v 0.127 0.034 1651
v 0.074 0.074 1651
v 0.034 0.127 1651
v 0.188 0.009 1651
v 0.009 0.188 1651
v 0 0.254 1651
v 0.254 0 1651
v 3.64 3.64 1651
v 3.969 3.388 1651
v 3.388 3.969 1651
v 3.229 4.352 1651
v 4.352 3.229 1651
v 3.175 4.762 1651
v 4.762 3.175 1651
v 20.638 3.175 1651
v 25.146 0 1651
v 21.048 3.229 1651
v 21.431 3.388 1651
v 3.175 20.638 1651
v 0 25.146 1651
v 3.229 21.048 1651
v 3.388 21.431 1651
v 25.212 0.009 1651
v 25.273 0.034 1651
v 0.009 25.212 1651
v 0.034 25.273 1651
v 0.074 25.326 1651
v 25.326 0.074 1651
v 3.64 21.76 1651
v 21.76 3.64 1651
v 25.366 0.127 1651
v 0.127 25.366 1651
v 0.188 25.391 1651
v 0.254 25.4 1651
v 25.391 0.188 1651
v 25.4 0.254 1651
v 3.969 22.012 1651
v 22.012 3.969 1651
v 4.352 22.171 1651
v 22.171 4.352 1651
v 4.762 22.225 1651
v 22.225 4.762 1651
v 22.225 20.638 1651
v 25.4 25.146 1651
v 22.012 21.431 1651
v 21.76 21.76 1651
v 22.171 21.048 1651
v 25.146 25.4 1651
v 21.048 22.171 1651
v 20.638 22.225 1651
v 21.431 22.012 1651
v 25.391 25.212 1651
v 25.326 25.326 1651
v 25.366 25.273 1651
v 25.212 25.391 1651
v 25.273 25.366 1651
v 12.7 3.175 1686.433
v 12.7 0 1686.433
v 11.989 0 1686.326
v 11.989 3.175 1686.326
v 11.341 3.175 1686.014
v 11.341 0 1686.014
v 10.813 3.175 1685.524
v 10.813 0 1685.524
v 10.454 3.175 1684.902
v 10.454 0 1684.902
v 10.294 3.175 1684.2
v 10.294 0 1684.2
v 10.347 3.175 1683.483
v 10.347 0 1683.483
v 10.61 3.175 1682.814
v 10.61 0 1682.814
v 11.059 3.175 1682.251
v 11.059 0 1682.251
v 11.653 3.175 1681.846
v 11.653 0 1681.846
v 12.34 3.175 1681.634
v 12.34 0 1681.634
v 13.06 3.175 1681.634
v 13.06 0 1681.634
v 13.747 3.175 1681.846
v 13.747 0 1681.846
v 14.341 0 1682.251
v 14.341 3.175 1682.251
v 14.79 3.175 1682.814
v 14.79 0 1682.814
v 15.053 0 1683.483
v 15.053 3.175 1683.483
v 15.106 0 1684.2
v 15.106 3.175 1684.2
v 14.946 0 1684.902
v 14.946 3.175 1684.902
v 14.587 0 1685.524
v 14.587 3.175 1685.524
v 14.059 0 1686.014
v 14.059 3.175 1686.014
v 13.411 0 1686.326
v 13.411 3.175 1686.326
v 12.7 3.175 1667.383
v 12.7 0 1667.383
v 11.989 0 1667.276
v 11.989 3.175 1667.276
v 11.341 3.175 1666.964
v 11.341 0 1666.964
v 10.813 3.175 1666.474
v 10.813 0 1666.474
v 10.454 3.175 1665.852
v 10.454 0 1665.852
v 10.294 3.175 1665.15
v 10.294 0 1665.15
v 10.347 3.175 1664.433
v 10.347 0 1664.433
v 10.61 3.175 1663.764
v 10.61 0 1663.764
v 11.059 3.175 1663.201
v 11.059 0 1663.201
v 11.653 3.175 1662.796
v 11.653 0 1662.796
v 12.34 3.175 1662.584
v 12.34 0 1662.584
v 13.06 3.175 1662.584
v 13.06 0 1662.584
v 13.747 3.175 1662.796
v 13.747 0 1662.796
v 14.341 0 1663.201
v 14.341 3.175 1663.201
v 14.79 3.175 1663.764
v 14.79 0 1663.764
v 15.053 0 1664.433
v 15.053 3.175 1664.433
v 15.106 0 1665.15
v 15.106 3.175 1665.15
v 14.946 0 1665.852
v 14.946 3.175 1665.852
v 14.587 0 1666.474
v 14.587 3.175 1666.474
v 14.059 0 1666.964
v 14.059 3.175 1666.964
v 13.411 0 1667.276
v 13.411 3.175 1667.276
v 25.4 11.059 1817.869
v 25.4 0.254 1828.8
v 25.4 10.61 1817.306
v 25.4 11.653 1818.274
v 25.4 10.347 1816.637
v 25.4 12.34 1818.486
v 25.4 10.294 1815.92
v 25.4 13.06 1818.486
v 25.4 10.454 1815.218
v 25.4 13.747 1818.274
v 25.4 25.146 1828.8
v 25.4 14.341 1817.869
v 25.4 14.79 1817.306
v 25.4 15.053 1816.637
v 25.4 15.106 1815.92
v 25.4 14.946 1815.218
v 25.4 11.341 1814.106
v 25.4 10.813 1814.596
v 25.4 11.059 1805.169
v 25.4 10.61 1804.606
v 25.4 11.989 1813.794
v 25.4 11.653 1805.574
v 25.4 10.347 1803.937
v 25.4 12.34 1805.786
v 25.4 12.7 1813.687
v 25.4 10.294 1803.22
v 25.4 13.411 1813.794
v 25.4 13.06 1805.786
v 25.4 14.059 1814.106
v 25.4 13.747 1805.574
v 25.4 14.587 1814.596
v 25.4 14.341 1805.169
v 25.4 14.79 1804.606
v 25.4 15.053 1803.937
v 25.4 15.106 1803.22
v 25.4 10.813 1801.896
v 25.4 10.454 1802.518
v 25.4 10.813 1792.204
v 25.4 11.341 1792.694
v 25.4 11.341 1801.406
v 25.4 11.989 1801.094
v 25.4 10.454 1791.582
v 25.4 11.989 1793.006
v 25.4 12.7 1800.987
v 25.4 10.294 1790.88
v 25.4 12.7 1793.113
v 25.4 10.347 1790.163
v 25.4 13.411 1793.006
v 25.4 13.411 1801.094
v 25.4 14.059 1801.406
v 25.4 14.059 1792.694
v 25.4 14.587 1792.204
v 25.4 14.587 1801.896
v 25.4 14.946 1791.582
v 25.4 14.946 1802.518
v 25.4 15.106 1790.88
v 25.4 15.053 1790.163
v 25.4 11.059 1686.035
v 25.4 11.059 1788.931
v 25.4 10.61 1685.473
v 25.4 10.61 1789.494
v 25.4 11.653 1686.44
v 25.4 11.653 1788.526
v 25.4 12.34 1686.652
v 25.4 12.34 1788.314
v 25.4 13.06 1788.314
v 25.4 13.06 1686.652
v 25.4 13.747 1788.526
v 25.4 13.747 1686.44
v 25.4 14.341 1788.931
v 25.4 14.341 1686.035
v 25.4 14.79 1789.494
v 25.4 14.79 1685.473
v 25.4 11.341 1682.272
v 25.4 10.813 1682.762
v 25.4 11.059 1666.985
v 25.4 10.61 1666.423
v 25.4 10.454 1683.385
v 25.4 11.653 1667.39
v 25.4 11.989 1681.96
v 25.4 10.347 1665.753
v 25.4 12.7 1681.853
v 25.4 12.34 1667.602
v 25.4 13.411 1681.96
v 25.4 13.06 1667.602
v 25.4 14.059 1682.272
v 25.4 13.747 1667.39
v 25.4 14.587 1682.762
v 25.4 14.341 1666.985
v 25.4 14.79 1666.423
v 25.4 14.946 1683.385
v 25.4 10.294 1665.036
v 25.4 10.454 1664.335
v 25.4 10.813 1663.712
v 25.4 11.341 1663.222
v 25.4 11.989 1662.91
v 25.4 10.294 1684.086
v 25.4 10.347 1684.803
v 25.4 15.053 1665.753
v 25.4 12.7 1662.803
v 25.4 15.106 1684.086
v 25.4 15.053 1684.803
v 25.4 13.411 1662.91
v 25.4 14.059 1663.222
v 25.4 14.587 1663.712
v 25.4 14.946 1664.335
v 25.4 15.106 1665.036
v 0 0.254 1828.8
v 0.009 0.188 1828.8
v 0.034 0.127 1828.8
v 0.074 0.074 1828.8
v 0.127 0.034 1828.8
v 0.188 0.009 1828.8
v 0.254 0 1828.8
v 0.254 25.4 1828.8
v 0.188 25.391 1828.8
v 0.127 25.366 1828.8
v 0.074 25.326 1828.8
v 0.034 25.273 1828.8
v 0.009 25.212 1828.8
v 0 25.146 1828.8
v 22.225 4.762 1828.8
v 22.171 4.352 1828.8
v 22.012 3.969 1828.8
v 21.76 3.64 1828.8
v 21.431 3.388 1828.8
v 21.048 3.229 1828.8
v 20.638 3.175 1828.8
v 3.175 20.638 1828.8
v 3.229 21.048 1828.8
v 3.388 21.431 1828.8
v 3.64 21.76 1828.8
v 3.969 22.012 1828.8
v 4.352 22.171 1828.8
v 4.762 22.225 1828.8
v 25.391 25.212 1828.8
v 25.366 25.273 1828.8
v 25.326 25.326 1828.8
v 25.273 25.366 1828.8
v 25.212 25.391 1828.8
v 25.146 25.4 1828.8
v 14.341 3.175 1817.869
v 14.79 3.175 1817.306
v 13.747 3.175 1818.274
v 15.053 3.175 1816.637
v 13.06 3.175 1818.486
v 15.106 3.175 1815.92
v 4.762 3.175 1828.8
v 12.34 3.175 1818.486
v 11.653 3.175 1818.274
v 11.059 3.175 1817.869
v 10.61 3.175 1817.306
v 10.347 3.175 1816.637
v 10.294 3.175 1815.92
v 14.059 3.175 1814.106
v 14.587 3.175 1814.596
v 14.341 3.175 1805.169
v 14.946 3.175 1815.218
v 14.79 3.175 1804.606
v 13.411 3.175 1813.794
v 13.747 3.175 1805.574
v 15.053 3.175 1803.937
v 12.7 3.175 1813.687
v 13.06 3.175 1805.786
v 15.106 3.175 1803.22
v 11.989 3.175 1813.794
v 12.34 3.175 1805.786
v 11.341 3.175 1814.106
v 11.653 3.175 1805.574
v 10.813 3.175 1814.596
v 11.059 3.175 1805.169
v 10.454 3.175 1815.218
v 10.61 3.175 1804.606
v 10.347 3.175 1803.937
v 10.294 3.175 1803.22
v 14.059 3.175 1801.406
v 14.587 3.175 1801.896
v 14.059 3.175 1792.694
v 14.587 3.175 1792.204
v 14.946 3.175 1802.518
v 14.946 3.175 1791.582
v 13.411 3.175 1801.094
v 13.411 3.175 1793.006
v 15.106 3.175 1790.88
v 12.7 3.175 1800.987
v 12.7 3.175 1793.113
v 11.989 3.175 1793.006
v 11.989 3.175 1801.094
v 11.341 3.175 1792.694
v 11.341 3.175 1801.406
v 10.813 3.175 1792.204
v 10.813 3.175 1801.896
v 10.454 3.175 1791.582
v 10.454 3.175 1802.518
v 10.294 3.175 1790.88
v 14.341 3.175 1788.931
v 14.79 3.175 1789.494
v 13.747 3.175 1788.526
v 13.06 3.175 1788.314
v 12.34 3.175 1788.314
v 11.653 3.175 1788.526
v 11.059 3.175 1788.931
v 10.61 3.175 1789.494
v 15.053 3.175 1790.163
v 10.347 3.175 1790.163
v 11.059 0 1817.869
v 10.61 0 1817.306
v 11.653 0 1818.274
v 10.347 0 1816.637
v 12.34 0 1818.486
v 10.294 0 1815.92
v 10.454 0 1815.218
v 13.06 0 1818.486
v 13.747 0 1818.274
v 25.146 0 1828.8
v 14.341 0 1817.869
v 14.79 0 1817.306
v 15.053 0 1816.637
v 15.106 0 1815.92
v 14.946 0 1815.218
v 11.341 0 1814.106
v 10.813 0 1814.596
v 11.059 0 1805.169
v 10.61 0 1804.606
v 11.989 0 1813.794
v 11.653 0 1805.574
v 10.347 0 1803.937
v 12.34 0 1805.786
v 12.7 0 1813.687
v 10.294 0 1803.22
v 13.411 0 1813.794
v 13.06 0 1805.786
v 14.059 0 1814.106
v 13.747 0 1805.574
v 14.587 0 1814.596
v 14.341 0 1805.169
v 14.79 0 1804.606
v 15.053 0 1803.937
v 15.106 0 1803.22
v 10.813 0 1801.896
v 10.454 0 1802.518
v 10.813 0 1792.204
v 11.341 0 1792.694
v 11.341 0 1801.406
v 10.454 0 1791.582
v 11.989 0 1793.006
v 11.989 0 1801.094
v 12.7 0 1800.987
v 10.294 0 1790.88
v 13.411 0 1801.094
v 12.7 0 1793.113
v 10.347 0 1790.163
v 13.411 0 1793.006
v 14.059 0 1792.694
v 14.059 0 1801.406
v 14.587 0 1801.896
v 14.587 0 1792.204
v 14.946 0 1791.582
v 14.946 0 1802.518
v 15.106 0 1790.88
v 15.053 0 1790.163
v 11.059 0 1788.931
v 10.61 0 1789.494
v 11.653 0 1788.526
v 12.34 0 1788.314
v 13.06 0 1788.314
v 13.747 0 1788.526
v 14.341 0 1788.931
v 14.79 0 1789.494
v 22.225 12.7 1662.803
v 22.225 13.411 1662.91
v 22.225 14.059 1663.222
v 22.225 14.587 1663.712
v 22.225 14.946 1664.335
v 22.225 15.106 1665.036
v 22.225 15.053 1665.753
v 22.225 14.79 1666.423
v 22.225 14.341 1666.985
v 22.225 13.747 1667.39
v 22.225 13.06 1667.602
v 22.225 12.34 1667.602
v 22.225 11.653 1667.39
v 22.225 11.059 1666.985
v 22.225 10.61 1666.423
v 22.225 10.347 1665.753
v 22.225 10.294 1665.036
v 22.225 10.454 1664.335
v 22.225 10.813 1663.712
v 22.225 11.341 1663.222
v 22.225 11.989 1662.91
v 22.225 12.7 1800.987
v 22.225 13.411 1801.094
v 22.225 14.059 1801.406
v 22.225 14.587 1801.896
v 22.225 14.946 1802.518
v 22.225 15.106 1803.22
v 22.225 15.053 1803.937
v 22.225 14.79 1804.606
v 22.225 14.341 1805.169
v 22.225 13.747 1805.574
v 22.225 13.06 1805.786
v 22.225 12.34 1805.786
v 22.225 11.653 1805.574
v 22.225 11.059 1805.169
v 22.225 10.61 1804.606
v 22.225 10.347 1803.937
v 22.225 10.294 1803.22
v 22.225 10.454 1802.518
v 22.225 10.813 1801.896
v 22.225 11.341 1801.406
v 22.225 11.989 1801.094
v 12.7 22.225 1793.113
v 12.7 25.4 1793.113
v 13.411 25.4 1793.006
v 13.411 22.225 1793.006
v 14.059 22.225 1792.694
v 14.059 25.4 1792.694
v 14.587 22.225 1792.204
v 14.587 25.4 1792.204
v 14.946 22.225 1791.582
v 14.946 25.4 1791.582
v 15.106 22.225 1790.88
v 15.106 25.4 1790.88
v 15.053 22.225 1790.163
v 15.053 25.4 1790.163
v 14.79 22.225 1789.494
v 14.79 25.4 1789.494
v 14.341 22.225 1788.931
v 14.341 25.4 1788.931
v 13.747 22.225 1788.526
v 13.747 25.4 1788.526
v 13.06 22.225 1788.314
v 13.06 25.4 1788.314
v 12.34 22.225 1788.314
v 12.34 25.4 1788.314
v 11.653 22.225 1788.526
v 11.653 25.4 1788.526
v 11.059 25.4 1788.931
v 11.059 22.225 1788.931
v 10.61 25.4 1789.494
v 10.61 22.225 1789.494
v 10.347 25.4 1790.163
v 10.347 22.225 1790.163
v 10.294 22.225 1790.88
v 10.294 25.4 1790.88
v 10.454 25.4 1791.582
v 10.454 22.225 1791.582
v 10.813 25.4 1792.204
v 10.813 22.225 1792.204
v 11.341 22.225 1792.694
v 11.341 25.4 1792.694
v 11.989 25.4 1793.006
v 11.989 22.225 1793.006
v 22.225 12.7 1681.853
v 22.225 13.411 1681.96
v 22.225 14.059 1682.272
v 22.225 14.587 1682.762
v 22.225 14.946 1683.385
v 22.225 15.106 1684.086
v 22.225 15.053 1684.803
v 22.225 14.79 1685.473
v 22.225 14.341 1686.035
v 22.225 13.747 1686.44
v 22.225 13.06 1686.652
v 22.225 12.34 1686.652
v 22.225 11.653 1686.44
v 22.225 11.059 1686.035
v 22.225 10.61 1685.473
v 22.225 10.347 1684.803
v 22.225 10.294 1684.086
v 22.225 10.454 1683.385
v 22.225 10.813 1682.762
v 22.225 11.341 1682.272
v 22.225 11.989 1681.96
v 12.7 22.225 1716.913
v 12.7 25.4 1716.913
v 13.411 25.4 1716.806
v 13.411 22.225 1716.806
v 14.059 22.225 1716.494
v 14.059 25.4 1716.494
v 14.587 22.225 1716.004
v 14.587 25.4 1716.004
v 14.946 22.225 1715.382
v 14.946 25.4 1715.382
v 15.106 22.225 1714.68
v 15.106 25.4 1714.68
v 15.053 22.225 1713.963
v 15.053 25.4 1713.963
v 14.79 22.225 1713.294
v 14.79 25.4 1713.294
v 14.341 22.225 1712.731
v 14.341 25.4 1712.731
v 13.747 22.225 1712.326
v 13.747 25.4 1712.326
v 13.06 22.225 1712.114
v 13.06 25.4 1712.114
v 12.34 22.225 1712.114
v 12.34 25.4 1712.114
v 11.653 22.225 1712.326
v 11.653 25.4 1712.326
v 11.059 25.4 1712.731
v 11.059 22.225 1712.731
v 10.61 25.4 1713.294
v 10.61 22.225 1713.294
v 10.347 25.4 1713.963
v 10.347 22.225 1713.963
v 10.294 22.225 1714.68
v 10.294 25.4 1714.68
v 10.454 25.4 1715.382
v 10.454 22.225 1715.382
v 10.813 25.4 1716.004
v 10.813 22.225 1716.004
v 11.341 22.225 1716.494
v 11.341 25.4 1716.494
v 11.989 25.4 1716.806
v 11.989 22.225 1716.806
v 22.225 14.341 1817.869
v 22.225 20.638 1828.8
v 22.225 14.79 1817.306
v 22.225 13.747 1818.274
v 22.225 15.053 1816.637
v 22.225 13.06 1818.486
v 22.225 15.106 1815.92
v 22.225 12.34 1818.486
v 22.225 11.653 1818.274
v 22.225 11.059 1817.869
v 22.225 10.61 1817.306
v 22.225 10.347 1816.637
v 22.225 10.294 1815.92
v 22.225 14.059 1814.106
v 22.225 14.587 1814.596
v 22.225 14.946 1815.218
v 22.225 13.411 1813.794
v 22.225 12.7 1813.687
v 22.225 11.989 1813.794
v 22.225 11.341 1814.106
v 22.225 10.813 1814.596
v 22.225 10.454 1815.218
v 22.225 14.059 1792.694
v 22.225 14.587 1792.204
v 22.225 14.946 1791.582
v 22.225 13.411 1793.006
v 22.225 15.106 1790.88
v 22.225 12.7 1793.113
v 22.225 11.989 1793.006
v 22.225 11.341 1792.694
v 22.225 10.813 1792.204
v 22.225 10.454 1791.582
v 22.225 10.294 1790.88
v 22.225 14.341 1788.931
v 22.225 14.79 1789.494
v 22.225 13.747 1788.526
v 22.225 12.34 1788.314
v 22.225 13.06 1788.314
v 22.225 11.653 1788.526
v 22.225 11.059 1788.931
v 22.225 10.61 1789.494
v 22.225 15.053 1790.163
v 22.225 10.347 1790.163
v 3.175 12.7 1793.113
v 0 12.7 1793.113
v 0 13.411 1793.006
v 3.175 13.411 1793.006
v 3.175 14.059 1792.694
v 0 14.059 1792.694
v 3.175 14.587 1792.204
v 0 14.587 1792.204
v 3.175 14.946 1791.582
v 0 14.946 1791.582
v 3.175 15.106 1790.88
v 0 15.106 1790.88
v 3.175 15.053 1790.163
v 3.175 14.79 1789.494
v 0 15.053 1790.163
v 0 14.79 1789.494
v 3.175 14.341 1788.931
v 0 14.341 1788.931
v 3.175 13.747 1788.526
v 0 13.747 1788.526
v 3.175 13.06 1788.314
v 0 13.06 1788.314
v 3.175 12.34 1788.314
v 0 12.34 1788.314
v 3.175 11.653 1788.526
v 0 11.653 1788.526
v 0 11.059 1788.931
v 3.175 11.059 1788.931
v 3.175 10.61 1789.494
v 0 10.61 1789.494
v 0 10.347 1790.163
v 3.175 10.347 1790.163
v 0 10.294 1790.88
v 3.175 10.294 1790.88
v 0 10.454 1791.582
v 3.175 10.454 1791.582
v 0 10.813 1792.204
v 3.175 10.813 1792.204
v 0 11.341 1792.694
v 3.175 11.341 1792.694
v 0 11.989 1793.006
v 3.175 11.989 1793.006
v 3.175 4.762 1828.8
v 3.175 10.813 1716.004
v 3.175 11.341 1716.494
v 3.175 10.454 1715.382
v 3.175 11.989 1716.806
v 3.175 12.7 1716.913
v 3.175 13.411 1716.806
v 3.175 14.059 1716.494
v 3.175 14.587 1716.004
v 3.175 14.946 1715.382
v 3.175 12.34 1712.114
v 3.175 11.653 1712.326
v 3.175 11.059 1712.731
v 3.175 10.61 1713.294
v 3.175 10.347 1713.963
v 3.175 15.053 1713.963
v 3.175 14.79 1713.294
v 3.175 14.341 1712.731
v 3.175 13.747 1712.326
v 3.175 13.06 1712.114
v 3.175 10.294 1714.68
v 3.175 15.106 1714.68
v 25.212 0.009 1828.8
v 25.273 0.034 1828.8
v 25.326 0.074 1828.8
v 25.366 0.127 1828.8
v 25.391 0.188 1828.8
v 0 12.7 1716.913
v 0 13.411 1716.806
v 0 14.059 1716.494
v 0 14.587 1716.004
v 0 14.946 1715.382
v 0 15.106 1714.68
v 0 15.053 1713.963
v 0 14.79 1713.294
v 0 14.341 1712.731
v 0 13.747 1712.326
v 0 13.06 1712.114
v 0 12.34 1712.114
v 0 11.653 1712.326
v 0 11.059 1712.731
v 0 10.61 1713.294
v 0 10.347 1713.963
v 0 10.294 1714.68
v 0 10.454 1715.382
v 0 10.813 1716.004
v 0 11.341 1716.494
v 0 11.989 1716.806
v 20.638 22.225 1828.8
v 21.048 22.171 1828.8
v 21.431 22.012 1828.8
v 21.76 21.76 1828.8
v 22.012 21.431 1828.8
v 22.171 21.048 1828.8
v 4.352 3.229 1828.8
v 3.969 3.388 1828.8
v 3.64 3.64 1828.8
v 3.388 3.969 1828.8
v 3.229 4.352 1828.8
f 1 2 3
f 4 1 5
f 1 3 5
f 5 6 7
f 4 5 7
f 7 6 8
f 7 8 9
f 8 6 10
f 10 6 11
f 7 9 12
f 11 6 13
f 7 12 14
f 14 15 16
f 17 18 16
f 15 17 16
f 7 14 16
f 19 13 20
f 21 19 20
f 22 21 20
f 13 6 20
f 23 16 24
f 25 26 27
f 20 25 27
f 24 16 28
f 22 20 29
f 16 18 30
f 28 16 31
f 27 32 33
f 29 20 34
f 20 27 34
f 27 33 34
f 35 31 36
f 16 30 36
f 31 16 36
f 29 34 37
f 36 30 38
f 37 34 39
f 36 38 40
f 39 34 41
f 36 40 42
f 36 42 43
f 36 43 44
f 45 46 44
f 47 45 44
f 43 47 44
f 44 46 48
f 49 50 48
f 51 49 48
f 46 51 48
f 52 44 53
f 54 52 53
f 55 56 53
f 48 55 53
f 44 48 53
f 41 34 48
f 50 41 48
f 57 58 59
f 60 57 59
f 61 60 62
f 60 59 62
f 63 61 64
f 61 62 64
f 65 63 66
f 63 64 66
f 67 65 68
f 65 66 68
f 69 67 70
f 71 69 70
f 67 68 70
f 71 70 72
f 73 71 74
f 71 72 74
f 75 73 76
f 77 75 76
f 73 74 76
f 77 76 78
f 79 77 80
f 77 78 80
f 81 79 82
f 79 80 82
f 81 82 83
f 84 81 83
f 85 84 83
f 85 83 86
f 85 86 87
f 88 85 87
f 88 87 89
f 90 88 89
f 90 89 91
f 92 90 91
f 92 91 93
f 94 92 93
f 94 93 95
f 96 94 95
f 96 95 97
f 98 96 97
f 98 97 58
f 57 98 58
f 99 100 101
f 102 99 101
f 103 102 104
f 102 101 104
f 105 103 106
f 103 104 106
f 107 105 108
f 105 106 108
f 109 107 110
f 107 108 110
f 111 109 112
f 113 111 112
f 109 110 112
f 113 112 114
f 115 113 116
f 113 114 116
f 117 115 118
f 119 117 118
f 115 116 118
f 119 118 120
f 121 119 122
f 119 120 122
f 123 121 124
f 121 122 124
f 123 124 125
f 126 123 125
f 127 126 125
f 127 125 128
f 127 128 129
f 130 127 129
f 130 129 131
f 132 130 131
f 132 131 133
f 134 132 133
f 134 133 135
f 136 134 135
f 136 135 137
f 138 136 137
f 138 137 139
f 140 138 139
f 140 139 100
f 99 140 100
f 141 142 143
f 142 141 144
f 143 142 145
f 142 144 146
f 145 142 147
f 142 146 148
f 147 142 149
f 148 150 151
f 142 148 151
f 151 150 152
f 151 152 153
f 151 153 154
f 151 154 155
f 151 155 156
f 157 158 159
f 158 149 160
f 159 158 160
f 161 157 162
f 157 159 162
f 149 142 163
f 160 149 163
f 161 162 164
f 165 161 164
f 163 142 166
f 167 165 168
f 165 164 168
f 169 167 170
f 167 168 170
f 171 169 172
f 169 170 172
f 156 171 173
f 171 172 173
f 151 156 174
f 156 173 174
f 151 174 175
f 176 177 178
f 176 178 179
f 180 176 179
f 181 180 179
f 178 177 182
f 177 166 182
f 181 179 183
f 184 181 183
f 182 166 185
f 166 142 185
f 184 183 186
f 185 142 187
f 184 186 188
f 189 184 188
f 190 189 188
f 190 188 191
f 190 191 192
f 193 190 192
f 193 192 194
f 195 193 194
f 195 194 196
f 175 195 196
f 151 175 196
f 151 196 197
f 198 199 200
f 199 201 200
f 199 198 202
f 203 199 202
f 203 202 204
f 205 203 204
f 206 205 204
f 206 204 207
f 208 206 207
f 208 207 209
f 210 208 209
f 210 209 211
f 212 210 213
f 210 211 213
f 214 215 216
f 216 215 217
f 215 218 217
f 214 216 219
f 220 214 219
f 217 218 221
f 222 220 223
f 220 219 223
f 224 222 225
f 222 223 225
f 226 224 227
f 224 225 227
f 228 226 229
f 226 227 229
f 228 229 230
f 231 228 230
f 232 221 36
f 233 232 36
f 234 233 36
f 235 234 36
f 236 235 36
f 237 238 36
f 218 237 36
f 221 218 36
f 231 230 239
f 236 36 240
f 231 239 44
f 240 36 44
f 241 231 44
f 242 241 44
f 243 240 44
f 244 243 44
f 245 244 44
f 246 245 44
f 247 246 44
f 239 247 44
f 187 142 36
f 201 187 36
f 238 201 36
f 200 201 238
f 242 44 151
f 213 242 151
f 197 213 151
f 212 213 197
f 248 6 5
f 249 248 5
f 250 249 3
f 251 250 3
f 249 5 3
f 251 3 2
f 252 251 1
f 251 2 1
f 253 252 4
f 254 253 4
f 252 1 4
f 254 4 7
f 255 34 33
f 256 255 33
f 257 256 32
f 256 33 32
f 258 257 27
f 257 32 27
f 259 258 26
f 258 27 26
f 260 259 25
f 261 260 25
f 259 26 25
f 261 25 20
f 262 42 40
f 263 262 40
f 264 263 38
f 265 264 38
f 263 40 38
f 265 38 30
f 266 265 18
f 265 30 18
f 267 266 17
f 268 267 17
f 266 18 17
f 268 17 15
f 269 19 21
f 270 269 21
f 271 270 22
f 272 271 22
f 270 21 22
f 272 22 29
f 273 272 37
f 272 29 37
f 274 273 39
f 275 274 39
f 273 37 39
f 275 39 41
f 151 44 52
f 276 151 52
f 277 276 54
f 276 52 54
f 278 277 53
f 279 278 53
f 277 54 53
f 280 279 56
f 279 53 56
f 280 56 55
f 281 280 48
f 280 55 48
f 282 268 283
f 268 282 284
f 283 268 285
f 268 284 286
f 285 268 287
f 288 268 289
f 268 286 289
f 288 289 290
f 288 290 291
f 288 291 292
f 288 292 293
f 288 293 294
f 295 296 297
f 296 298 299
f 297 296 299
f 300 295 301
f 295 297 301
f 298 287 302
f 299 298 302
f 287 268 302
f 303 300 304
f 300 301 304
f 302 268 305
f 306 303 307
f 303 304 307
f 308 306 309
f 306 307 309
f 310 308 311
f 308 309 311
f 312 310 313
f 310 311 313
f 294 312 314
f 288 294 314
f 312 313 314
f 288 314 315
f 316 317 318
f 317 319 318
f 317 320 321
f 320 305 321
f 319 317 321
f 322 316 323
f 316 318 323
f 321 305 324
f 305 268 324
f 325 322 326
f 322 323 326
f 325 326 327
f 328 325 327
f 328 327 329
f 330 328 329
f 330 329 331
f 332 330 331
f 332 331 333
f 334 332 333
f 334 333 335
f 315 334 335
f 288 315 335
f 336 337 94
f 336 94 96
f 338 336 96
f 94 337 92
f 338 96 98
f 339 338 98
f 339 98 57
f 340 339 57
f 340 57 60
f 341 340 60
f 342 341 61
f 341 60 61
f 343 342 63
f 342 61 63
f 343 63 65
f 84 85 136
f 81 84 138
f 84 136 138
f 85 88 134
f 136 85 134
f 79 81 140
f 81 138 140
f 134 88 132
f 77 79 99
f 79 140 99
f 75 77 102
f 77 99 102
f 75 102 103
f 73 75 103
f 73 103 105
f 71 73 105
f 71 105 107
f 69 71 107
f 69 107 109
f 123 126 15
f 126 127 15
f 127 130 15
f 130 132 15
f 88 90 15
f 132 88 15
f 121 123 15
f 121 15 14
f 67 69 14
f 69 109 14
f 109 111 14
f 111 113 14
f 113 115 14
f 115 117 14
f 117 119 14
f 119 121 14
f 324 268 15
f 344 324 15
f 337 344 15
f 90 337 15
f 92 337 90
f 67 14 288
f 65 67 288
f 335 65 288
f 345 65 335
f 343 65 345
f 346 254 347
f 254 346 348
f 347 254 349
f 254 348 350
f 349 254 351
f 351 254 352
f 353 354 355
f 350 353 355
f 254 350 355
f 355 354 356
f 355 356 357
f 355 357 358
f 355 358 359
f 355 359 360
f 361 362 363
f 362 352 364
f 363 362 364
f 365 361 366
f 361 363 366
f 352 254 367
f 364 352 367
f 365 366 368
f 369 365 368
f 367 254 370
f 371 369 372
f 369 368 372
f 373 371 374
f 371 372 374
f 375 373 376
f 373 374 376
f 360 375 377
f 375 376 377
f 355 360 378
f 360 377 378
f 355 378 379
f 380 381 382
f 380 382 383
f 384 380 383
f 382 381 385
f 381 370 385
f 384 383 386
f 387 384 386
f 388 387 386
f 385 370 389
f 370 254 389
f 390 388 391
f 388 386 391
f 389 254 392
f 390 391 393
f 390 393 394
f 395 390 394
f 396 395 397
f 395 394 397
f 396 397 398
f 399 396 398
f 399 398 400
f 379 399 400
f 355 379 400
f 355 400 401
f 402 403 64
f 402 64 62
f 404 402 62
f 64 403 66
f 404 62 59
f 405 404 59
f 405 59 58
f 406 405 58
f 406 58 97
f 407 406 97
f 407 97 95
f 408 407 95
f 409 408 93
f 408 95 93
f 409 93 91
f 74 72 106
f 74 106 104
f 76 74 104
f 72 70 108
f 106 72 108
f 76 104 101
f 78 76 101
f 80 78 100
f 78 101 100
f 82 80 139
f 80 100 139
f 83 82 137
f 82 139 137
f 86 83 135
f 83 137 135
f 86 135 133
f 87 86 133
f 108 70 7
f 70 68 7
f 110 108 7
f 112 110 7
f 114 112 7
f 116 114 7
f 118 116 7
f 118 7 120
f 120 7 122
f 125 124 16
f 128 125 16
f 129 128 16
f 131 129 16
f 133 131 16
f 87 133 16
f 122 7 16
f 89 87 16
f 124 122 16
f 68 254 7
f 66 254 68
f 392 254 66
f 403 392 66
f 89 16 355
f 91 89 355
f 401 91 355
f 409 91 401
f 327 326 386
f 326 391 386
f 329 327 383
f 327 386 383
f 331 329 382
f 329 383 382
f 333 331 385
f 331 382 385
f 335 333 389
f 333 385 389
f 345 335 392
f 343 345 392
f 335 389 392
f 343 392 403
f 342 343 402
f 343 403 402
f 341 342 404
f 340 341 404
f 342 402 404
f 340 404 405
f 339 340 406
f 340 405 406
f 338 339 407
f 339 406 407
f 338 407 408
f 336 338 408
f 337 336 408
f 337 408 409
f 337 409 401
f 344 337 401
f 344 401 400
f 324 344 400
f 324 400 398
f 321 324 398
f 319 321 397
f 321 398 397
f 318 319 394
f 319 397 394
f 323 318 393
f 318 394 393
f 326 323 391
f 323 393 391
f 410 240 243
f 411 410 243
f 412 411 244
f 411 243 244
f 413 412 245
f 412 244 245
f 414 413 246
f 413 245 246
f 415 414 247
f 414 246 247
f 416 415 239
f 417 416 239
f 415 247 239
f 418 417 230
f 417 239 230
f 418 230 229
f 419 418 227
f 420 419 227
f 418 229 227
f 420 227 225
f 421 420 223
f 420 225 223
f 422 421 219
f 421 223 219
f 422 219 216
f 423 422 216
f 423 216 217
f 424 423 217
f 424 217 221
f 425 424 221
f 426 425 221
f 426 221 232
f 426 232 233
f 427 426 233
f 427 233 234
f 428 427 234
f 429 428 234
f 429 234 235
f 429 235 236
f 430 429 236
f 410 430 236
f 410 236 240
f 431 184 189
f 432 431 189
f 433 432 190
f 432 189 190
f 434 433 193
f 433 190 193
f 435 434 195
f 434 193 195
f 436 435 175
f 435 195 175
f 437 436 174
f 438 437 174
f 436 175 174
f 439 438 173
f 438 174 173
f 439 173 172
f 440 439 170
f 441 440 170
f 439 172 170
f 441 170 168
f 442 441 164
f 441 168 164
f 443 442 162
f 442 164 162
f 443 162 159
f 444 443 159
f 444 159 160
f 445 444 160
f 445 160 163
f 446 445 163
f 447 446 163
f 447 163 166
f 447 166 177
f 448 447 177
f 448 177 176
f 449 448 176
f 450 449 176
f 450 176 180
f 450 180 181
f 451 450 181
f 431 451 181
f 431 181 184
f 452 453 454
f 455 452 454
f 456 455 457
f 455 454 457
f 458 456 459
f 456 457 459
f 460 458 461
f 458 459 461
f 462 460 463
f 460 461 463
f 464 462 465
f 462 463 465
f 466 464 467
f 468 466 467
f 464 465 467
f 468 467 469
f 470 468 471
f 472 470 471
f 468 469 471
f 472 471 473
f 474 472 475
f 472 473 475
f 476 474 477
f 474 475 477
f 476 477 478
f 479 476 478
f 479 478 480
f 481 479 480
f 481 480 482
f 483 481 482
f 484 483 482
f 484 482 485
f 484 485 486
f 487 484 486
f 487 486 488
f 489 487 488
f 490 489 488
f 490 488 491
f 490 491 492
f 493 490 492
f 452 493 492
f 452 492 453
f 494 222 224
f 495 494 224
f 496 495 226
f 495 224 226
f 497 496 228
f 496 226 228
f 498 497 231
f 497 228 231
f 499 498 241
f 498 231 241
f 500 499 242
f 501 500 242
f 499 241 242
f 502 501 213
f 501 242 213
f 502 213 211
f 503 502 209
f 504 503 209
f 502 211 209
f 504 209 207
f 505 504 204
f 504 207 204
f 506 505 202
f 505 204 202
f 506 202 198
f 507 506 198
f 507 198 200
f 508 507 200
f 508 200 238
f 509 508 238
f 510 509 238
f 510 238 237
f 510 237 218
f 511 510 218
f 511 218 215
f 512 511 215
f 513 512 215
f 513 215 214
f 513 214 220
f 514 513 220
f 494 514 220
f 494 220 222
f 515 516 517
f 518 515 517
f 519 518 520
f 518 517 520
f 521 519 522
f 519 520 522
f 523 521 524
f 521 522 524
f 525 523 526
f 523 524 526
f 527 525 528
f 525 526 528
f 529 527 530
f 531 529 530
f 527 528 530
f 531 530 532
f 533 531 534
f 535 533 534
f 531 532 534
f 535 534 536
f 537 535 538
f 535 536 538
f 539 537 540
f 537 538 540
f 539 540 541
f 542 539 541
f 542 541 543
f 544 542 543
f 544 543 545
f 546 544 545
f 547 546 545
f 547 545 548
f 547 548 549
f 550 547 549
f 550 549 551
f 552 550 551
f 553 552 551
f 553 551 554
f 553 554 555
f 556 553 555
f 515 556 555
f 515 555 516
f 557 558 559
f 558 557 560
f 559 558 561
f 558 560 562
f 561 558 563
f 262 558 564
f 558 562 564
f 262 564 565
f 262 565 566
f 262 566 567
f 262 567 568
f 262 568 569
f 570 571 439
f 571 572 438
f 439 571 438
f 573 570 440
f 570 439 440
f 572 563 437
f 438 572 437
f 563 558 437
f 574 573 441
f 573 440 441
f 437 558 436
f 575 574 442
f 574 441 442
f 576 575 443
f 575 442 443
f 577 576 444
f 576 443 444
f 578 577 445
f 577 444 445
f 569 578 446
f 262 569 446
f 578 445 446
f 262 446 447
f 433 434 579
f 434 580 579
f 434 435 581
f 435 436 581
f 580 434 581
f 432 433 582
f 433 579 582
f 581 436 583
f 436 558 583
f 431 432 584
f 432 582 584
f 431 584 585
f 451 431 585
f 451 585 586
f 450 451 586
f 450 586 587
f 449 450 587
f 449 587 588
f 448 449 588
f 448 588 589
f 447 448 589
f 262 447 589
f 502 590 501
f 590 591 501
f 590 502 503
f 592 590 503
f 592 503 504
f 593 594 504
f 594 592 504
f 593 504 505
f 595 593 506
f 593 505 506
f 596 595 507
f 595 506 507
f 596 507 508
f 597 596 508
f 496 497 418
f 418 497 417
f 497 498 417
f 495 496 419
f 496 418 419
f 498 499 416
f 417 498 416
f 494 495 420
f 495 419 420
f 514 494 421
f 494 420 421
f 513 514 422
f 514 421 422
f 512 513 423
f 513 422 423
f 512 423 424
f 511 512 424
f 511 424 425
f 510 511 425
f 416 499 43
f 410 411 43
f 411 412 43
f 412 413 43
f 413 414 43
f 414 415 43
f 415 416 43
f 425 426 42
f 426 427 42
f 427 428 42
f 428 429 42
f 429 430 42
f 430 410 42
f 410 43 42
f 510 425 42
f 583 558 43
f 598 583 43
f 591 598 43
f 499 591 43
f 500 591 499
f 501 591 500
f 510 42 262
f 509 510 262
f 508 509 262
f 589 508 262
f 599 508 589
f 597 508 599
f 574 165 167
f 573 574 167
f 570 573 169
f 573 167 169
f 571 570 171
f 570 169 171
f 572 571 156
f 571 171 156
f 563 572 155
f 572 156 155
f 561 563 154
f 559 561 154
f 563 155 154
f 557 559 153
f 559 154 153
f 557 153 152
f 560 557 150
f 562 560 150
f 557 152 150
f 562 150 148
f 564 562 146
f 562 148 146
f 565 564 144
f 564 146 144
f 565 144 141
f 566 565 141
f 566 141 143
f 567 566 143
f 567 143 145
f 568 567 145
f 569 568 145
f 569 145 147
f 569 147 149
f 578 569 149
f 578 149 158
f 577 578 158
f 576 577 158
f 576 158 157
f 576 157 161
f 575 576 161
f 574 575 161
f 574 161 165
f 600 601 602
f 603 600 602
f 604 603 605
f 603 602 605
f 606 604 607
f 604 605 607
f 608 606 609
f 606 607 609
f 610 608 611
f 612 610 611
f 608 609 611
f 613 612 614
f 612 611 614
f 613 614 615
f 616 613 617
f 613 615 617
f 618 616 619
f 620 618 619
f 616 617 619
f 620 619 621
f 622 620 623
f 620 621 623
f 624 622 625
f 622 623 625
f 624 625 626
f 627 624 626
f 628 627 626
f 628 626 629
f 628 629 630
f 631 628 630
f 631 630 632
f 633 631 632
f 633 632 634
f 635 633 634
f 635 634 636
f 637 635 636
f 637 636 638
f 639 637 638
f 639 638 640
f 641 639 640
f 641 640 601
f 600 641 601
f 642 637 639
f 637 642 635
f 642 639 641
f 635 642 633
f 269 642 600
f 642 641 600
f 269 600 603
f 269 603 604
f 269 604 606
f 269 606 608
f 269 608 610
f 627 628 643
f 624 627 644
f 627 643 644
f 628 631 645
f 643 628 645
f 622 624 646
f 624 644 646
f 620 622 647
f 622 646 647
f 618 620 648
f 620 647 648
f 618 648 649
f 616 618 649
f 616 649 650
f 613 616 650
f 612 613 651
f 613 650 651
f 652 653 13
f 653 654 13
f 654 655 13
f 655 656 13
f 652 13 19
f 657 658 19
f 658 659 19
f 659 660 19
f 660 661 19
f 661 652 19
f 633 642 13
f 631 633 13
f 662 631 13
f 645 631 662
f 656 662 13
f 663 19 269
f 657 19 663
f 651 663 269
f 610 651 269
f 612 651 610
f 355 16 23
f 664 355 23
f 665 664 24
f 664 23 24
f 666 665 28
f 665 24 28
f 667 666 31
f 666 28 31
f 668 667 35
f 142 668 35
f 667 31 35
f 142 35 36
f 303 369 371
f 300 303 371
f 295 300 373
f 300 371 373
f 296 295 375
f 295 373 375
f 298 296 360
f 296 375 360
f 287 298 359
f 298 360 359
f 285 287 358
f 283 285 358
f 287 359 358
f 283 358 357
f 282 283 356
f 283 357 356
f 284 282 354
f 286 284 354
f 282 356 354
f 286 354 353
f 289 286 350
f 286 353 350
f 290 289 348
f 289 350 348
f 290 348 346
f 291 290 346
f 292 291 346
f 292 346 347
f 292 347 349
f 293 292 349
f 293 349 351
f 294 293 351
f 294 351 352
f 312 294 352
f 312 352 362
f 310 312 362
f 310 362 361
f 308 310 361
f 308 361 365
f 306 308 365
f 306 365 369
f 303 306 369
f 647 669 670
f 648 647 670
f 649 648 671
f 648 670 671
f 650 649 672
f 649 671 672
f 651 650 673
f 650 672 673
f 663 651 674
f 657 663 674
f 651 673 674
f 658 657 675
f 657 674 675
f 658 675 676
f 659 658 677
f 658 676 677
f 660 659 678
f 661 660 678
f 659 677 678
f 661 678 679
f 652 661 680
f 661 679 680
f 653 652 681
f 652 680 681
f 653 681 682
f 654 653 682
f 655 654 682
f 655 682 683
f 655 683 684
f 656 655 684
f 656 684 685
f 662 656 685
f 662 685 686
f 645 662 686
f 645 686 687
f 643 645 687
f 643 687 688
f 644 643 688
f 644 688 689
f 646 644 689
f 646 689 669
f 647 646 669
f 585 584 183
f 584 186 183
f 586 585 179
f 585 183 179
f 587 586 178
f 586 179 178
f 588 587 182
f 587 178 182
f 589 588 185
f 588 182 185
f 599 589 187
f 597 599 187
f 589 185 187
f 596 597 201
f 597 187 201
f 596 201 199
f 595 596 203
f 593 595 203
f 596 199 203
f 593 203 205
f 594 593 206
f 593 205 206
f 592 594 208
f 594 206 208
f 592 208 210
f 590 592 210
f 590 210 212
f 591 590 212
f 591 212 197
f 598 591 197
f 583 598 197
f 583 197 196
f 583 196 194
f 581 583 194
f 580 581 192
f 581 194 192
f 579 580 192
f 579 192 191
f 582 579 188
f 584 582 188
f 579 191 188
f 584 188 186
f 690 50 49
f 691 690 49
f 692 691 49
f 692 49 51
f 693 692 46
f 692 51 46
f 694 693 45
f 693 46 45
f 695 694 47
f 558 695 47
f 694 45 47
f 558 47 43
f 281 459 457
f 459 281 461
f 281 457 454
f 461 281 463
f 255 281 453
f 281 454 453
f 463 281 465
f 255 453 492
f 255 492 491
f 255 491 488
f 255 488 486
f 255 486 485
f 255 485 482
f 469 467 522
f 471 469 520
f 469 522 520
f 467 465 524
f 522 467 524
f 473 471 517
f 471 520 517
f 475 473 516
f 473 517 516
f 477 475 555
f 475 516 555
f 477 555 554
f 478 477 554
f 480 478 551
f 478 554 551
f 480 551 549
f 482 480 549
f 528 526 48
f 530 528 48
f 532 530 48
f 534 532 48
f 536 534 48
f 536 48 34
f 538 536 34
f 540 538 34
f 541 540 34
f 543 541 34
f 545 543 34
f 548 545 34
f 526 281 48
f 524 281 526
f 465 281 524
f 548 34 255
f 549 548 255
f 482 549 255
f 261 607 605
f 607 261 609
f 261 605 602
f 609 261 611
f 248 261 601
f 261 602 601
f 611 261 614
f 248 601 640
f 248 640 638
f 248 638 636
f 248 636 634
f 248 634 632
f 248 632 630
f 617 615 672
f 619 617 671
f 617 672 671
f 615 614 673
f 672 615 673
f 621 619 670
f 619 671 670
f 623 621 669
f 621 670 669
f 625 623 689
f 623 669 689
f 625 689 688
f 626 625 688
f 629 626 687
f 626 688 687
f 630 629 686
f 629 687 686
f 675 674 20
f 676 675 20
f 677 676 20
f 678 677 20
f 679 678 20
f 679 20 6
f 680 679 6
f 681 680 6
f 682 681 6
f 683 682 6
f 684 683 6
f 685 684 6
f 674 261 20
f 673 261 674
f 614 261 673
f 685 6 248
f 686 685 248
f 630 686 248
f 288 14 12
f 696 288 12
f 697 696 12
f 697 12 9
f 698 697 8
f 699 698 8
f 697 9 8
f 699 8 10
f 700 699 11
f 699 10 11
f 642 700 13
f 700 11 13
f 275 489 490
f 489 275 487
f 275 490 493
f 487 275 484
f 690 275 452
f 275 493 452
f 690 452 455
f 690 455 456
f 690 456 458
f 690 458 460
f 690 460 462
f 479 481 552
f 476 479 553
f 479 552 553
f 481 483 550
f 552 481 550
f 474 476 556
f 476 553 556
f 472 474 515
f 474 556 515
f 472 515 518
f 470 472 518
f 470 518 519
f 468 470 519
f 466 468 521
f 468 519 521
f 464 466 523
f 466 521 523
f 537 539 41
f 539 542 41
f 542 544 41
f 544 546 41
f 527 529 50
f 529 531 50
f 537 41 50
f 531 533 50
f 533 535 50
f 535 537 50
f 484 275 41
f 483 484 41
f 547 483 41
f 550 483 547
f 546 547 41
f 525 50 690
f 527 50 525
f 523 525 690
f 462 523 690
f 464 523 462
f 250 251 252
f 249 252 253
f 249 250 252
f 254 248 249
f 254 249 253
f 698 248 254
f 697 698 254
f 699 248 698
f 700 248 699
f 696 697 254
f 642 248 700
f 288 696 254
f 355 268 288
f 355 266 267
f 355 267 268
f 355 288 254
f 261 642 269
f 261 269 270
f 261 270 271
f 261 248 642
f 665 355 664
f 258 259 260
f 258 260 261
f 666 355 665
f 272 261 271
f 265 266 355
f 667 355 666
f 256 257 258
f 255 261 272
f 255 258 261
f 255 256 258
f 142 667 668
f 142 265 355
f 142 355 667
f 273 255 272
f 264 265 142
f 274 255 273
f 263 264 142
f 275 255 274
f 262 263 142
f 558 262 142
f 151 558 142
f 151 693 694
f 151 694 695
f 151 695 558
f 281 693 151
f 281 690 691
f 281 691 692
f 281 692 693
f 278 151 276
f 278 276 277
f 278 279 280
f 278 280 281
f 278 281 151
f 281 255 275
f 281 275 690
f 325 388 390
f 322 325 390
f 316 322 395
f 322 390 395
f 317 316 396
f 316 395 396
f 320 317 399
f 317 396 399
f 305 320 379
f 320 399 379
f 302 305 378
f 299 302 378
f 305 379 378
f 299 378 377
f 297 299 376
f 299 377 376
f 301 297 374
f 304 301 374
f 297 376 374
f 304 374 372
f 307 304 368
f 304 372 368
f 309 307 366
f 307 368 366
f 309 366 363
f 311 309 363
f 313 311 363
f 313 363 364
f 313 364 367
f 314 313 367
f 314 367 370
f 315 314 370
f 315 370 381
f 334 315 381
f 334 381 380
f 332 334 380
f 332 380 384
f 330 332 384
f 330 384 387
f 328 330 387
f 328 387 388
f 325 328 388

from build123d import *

# Parameters (mm, degrees)
CUT_EXTRUDE1_START = 1651
CUT_EXTRUDE1_DEPTH = 177.8
CUT_EXTRUDE2_REACH = 1831.153
SKETCH2_R          = 2.413
CUT_EXTRUDE3_REACH = 1831.153
SKETCH5_R          = 2.413
SKETCH6_R          = 2.413
CUT_EXTRUDE6_DEPTH = 12.7
SKETCH7_R          = 2.413
CUT_EXTRUDE7_DEPTH = 12.7
CUT_EXTRUDE8_REACH = 1831.153
SKETCH8_R          = 2.413
CUT_EXTRUDE9_REACH = 1831.153
SKETCH9_R          = 2.413


with BuildPart() as part:
    # Cut-Extrude1: read off the stored shape, not the designer's step
    # Cut-Extrude1 outline → Cut-Extrude1 (new body)
    with BuildSketch(Plane.XY.offset(CUT_EXTRUDE1_START)):
        with BuildLine():
            Line((0, 25.146), (0, 0.254))
            ThreePointArc((0, 0.254), (0.074394878, 0.074394878), (0.254, 0))
            Line((0.254, 0), (25.146, 0))
            ThreePointArc((25.146, 0), (25.325605122, 0.074394878), (25.4, 0.254))
            Line((25.4, 0.254), (25.4, 25.146))
            ThreePointArc((25.4, 25.146), (25.325605122, 25.325605122), (25.146, 25.4))
            Line((25.146, 25.4), (0.254, 25.4))
            ThreePointArc((0.254, 25.4), (0.074394878, 25.325605122), (0, 25.146))
        make_face()
        with BuildLine():
            ThreePointArc((4.7625, 3.175), (3.639967985, 3.639967985), (3.175, 4.7625))
            Line((3.175, 4.7625), (3.175, 20.6375))
            ThreePointArc((3.175, 20.6375), (3.639967985, 21.760032015), (4.7625, 22.225))
            Line((4.7625, 22.225), (20.6375, 22.225))
            ThreePointArc((20.6375, 22.225), (21.760032015, 21.760032015), (22.225, 20.6375))
            Line((22.225, 20.6375), (22.225, 4.7625))
            ThreePointArc((22.225, 4.7625), (21.760032015, 3.639967985), (20.6375, 3.175))
            Line((20.6375, 3.175), (4.7625, 3.175))
        make_face(mode=Mode.SUBTRACT)
    extrude(amount=CUT_EXTRUDE1_DEPTH)

    # Sketch2 → Cut-Extrude2 (cut, up to next)
    with BuildSketch(Plane(origin=(25.4, 0, 0), x_dir=(0, 0, -1), z_dir=(1, 0, 0)), mode=Mode.PRIVATE) as cut_extrude2_sk1:
        with Locations((-1665.216211664, 12.7)):
            Circle(SKETCH2_R)
    cut_extrude2_tool1 = extrude(cut_extrude2_sk1.sketch, amount=-CUT_EXTRUDE2_REACH, mode=Mode.PRIVATE) & part.part
    # Sketch2 → Cut-Extrude2 (cut, up to next)
    with BuildSketch(Plane(origin=(25.4, 0, 0), x_dir=(0, 0, -1), z_dir=(1, 0, 0)), mode=Mode.PRIVATE) as cut_extrude2_sk2:
        with Locations((-1684.266211664, 12.7)):
            Circle(SKETCH2_R)
    cut_extrude2_tool2 = extrude(cut_extrude2_sk2.sketch, amount=-CUT_EXTRUDE2_REACH, mode=Mode.PRIVATE) & part.part
    add(cut_extrude2_tool1.solids().sort_by_distance((25.4, 12.7, 1665.216212))[0], mode=Mode.SUBTRACT)
    add(cut_extrude2_tool2.solids().sort_by_distance((25.4, 12.7, 1684.266212))[0], mode=Mode.SUBTRACT)

    # Sketch5 → Cut-Extrude3 (cut, up to next)
    with BuildSketch(Plane.XZ, mode=Mode.PRIVATE) as cut_extrude3_sk1:
        with Locations(Location((12.7, 1684.02, 0), (0, 0, 90))):
            Circle(SKETCH5_R)
    cut_extrude3_tool1 = extrude(cut_extrude3_sk1.sketch, amount=-CUT_EXTRUDE3_REACH, mode=Mode.PRIVATE) & part.part
    # Sketch5 → Cut-Extrude3 (cut, up to next)
    with BuildSketch(Plane.XZ, mode=Mode.PRIVATE) as cut_extrude3_sk2:
        with Locations(Location((12.7, 1664.97, 0), (0, 0, 90))):
            Circle(SKETCH5_R)
    cut_extrude3_tool2 = extrude(cut_extrude3_sk2.sketch, amount=-CUT_EXTRUDE3_REACH, mode=Mode.PRIVATE) & part.part
    add(cut_extrude3_tool1.solids().sort_by_distance((12.7, 0, 1684.02))[0], mode=Mode.SUBTRACT)
    add(cut_extrude3_tool2.solids().sort_by_distance((12.7, 0, 1664.97))[0], mode=Mode.SUBTRACT)

    # Sketch6 → Cut-Extrude6 (cut)
    with BuildSketch(Plane(origin=(0, 25.4, 0), x_dir=(1, 0, 0), z_dir=(0, 1, 0))):
        with Locations((12.7, -1638.3)):
            Circle(SKETCH6_R)
        with Locations(Location((12.7, -1714.5, 0), (0, 0, 270))):
            Circle(SKETCH6_R)
        with Locations(Location((12.7, -1790.7, 0), (0, 0, 270))):
            Circle(SKETCH6_R)
    extrude(amount=-CUT_EXTRUDE6_DEPTH, mode=Mode.SUBTRACT)

    # Sketch7 → Cut-Extrude7 (cut)
    with BuildSketch(Plane.ZY):
        with Locations((1638.3, 12.7)):
            Circle(SKETCH7_R)
        with Locations((1714.5, 12.7)):
            Circle(SKETCH7_R)
        with Locations((1790.7, 12.7)):
            Circle(SKETCH7_R)
    extrude(amount=-CUT_EXTRUDE7_DEPTH, mode=Mode.SUBTRACT)

    # Sketch8 → Cut-Extrude8 (cut, up to next)
    with BuildSketch(Plane(origin=(25.4, 0, 0), x_dir=(0, 0, -1), z_dir=(1, 0, 0)), mode=Mode.PRIVATE) as cut_extrude8_sk1:
        with Locations(Location((-1790.7, 12.7, 0), (0, 0, 180))):
            Circle(SKETCH8_R)
    cut_extrude8_tool1 = extrude(cut_extrude8_sk1.sketch, amount=-CUT_EXTRUDE8_REACH, mode=Mode.PRIVATE) & part.part
    # Sketch8 → Cut-Extrude8 (cut, up to next)
    with BuildSketch(Plane(origin=(25.4, 0, 0), x_dir=(0, 0, -1), z_dir=(1, 0, 0)), mode=Mode.PRIVATE) as cut_extrude8_sk2:
        with Locations((-1803.4, 12.7)):
            Circle(SKETCH8_R)
    cut_extrude8_tool2 = extrude(cut_extrude8_sk2.sketch, amount=-CUT_EXTRUDE8_REACH, mode=Mode.PRIVATE) & part.part
    # Sketch8 → Cut-Extrude8 (cut, up to next)
    with BuildSketch(Plane(origin=(25.4, 0, 0), x_dir=(0, 0, -1), z_dir=(1, 0, 0)), mode=Mode.PRIVATE) as cut_extrude8_sk3:
        with Locations((-1816.1, 12.7)):
            Circle(SKETCH8_R)
    cut_extrude8_tool3 = extrude(cut_extrude8_sk3.sketch, amount=-CUT_EXTRUDE8_REACH, mode=Mode.PRIVATE) & part.part
    add(cut_extrude8_tool1.solids().sort_by_distance((25.4, 12.7, 1790.7))[0], mode=Mode.SUBTRACT)
    add(cut_extrude8_tool2.solids().sort_by_distance((25.4, 12.7, 1803.4))[0], mode=Mode.SUBTRACT)
    add(cut_extrude8_tool3.solids().sort_by_distance((25.4, 12.7, 1816.1))[0], mode=Mode.SUBTRACT)

    # Sketch9 → Cut-Extrude9 (cut, up to next)
    with BuildSketch(Plane.XZ, mode=Mode.PRIVATE) as cut_extrude9_sk1:
        with Locations(Location((12.7, 1816.1, 0), (0, 0, 270))):
            Circle(SKETCH9_R)
    cut_extrude9_tool1 = extrude(cut_extrude9_sk1.sketch, amount=-CUT_EXTRUDE9_REACH, mode=Mode.PRIVATE) & part.part
    # Sketch9 → Cut-Extrude9 (cut, up to next)
    with BuildSketch(Plane.XZ, mode=Mode.PRIVATE) as cut_extrude9_sk2:
        with Locations(Location((12.7, 1803.4, 0), (0, 0, 270))):
            Circle(SKETCH9_R)
    cut_extrude9_tool2 = extrude(cut_extrude9_sk2.sketch, amount=-CUT_EXTRUDE9_REACH, mode=Mode.PRIVATE) & part.part
    # Sketch9 → Cut-Extrude9 (cut, up to next)
    with BuildSketch(Plane.XZ, mode=Mode.PRIVATE) as cut_extrude9_sk3:
        with Locations(Location((12.7, 1790.7, 0), (0, 0, 90))):
            Circle(SKETCH9_R)
    cut_extrude9_tool3 = extrude(cut_extrude9_sk3.sketch, amount=-CUT_EXTRUDE9_REACH, mode=Mode.PRIVATE) & part.part
    add(cut_extrude9_tool1.solids().sort_by_distance((12.7, 0, 1816.1))[0], mode=Mode.SUBTRACT)
    add(cut_extrude9_tool2.solids().sort_by_distance((12.7, 0, 1803.4))[0], mode=Mode.SUBTRACT)
    add(cut_extrude9_tool3.solids().sort_by_distance((12.7, 0, 1790.7))[0], mode=Mode.SUBTRACT)


solid = part.part
